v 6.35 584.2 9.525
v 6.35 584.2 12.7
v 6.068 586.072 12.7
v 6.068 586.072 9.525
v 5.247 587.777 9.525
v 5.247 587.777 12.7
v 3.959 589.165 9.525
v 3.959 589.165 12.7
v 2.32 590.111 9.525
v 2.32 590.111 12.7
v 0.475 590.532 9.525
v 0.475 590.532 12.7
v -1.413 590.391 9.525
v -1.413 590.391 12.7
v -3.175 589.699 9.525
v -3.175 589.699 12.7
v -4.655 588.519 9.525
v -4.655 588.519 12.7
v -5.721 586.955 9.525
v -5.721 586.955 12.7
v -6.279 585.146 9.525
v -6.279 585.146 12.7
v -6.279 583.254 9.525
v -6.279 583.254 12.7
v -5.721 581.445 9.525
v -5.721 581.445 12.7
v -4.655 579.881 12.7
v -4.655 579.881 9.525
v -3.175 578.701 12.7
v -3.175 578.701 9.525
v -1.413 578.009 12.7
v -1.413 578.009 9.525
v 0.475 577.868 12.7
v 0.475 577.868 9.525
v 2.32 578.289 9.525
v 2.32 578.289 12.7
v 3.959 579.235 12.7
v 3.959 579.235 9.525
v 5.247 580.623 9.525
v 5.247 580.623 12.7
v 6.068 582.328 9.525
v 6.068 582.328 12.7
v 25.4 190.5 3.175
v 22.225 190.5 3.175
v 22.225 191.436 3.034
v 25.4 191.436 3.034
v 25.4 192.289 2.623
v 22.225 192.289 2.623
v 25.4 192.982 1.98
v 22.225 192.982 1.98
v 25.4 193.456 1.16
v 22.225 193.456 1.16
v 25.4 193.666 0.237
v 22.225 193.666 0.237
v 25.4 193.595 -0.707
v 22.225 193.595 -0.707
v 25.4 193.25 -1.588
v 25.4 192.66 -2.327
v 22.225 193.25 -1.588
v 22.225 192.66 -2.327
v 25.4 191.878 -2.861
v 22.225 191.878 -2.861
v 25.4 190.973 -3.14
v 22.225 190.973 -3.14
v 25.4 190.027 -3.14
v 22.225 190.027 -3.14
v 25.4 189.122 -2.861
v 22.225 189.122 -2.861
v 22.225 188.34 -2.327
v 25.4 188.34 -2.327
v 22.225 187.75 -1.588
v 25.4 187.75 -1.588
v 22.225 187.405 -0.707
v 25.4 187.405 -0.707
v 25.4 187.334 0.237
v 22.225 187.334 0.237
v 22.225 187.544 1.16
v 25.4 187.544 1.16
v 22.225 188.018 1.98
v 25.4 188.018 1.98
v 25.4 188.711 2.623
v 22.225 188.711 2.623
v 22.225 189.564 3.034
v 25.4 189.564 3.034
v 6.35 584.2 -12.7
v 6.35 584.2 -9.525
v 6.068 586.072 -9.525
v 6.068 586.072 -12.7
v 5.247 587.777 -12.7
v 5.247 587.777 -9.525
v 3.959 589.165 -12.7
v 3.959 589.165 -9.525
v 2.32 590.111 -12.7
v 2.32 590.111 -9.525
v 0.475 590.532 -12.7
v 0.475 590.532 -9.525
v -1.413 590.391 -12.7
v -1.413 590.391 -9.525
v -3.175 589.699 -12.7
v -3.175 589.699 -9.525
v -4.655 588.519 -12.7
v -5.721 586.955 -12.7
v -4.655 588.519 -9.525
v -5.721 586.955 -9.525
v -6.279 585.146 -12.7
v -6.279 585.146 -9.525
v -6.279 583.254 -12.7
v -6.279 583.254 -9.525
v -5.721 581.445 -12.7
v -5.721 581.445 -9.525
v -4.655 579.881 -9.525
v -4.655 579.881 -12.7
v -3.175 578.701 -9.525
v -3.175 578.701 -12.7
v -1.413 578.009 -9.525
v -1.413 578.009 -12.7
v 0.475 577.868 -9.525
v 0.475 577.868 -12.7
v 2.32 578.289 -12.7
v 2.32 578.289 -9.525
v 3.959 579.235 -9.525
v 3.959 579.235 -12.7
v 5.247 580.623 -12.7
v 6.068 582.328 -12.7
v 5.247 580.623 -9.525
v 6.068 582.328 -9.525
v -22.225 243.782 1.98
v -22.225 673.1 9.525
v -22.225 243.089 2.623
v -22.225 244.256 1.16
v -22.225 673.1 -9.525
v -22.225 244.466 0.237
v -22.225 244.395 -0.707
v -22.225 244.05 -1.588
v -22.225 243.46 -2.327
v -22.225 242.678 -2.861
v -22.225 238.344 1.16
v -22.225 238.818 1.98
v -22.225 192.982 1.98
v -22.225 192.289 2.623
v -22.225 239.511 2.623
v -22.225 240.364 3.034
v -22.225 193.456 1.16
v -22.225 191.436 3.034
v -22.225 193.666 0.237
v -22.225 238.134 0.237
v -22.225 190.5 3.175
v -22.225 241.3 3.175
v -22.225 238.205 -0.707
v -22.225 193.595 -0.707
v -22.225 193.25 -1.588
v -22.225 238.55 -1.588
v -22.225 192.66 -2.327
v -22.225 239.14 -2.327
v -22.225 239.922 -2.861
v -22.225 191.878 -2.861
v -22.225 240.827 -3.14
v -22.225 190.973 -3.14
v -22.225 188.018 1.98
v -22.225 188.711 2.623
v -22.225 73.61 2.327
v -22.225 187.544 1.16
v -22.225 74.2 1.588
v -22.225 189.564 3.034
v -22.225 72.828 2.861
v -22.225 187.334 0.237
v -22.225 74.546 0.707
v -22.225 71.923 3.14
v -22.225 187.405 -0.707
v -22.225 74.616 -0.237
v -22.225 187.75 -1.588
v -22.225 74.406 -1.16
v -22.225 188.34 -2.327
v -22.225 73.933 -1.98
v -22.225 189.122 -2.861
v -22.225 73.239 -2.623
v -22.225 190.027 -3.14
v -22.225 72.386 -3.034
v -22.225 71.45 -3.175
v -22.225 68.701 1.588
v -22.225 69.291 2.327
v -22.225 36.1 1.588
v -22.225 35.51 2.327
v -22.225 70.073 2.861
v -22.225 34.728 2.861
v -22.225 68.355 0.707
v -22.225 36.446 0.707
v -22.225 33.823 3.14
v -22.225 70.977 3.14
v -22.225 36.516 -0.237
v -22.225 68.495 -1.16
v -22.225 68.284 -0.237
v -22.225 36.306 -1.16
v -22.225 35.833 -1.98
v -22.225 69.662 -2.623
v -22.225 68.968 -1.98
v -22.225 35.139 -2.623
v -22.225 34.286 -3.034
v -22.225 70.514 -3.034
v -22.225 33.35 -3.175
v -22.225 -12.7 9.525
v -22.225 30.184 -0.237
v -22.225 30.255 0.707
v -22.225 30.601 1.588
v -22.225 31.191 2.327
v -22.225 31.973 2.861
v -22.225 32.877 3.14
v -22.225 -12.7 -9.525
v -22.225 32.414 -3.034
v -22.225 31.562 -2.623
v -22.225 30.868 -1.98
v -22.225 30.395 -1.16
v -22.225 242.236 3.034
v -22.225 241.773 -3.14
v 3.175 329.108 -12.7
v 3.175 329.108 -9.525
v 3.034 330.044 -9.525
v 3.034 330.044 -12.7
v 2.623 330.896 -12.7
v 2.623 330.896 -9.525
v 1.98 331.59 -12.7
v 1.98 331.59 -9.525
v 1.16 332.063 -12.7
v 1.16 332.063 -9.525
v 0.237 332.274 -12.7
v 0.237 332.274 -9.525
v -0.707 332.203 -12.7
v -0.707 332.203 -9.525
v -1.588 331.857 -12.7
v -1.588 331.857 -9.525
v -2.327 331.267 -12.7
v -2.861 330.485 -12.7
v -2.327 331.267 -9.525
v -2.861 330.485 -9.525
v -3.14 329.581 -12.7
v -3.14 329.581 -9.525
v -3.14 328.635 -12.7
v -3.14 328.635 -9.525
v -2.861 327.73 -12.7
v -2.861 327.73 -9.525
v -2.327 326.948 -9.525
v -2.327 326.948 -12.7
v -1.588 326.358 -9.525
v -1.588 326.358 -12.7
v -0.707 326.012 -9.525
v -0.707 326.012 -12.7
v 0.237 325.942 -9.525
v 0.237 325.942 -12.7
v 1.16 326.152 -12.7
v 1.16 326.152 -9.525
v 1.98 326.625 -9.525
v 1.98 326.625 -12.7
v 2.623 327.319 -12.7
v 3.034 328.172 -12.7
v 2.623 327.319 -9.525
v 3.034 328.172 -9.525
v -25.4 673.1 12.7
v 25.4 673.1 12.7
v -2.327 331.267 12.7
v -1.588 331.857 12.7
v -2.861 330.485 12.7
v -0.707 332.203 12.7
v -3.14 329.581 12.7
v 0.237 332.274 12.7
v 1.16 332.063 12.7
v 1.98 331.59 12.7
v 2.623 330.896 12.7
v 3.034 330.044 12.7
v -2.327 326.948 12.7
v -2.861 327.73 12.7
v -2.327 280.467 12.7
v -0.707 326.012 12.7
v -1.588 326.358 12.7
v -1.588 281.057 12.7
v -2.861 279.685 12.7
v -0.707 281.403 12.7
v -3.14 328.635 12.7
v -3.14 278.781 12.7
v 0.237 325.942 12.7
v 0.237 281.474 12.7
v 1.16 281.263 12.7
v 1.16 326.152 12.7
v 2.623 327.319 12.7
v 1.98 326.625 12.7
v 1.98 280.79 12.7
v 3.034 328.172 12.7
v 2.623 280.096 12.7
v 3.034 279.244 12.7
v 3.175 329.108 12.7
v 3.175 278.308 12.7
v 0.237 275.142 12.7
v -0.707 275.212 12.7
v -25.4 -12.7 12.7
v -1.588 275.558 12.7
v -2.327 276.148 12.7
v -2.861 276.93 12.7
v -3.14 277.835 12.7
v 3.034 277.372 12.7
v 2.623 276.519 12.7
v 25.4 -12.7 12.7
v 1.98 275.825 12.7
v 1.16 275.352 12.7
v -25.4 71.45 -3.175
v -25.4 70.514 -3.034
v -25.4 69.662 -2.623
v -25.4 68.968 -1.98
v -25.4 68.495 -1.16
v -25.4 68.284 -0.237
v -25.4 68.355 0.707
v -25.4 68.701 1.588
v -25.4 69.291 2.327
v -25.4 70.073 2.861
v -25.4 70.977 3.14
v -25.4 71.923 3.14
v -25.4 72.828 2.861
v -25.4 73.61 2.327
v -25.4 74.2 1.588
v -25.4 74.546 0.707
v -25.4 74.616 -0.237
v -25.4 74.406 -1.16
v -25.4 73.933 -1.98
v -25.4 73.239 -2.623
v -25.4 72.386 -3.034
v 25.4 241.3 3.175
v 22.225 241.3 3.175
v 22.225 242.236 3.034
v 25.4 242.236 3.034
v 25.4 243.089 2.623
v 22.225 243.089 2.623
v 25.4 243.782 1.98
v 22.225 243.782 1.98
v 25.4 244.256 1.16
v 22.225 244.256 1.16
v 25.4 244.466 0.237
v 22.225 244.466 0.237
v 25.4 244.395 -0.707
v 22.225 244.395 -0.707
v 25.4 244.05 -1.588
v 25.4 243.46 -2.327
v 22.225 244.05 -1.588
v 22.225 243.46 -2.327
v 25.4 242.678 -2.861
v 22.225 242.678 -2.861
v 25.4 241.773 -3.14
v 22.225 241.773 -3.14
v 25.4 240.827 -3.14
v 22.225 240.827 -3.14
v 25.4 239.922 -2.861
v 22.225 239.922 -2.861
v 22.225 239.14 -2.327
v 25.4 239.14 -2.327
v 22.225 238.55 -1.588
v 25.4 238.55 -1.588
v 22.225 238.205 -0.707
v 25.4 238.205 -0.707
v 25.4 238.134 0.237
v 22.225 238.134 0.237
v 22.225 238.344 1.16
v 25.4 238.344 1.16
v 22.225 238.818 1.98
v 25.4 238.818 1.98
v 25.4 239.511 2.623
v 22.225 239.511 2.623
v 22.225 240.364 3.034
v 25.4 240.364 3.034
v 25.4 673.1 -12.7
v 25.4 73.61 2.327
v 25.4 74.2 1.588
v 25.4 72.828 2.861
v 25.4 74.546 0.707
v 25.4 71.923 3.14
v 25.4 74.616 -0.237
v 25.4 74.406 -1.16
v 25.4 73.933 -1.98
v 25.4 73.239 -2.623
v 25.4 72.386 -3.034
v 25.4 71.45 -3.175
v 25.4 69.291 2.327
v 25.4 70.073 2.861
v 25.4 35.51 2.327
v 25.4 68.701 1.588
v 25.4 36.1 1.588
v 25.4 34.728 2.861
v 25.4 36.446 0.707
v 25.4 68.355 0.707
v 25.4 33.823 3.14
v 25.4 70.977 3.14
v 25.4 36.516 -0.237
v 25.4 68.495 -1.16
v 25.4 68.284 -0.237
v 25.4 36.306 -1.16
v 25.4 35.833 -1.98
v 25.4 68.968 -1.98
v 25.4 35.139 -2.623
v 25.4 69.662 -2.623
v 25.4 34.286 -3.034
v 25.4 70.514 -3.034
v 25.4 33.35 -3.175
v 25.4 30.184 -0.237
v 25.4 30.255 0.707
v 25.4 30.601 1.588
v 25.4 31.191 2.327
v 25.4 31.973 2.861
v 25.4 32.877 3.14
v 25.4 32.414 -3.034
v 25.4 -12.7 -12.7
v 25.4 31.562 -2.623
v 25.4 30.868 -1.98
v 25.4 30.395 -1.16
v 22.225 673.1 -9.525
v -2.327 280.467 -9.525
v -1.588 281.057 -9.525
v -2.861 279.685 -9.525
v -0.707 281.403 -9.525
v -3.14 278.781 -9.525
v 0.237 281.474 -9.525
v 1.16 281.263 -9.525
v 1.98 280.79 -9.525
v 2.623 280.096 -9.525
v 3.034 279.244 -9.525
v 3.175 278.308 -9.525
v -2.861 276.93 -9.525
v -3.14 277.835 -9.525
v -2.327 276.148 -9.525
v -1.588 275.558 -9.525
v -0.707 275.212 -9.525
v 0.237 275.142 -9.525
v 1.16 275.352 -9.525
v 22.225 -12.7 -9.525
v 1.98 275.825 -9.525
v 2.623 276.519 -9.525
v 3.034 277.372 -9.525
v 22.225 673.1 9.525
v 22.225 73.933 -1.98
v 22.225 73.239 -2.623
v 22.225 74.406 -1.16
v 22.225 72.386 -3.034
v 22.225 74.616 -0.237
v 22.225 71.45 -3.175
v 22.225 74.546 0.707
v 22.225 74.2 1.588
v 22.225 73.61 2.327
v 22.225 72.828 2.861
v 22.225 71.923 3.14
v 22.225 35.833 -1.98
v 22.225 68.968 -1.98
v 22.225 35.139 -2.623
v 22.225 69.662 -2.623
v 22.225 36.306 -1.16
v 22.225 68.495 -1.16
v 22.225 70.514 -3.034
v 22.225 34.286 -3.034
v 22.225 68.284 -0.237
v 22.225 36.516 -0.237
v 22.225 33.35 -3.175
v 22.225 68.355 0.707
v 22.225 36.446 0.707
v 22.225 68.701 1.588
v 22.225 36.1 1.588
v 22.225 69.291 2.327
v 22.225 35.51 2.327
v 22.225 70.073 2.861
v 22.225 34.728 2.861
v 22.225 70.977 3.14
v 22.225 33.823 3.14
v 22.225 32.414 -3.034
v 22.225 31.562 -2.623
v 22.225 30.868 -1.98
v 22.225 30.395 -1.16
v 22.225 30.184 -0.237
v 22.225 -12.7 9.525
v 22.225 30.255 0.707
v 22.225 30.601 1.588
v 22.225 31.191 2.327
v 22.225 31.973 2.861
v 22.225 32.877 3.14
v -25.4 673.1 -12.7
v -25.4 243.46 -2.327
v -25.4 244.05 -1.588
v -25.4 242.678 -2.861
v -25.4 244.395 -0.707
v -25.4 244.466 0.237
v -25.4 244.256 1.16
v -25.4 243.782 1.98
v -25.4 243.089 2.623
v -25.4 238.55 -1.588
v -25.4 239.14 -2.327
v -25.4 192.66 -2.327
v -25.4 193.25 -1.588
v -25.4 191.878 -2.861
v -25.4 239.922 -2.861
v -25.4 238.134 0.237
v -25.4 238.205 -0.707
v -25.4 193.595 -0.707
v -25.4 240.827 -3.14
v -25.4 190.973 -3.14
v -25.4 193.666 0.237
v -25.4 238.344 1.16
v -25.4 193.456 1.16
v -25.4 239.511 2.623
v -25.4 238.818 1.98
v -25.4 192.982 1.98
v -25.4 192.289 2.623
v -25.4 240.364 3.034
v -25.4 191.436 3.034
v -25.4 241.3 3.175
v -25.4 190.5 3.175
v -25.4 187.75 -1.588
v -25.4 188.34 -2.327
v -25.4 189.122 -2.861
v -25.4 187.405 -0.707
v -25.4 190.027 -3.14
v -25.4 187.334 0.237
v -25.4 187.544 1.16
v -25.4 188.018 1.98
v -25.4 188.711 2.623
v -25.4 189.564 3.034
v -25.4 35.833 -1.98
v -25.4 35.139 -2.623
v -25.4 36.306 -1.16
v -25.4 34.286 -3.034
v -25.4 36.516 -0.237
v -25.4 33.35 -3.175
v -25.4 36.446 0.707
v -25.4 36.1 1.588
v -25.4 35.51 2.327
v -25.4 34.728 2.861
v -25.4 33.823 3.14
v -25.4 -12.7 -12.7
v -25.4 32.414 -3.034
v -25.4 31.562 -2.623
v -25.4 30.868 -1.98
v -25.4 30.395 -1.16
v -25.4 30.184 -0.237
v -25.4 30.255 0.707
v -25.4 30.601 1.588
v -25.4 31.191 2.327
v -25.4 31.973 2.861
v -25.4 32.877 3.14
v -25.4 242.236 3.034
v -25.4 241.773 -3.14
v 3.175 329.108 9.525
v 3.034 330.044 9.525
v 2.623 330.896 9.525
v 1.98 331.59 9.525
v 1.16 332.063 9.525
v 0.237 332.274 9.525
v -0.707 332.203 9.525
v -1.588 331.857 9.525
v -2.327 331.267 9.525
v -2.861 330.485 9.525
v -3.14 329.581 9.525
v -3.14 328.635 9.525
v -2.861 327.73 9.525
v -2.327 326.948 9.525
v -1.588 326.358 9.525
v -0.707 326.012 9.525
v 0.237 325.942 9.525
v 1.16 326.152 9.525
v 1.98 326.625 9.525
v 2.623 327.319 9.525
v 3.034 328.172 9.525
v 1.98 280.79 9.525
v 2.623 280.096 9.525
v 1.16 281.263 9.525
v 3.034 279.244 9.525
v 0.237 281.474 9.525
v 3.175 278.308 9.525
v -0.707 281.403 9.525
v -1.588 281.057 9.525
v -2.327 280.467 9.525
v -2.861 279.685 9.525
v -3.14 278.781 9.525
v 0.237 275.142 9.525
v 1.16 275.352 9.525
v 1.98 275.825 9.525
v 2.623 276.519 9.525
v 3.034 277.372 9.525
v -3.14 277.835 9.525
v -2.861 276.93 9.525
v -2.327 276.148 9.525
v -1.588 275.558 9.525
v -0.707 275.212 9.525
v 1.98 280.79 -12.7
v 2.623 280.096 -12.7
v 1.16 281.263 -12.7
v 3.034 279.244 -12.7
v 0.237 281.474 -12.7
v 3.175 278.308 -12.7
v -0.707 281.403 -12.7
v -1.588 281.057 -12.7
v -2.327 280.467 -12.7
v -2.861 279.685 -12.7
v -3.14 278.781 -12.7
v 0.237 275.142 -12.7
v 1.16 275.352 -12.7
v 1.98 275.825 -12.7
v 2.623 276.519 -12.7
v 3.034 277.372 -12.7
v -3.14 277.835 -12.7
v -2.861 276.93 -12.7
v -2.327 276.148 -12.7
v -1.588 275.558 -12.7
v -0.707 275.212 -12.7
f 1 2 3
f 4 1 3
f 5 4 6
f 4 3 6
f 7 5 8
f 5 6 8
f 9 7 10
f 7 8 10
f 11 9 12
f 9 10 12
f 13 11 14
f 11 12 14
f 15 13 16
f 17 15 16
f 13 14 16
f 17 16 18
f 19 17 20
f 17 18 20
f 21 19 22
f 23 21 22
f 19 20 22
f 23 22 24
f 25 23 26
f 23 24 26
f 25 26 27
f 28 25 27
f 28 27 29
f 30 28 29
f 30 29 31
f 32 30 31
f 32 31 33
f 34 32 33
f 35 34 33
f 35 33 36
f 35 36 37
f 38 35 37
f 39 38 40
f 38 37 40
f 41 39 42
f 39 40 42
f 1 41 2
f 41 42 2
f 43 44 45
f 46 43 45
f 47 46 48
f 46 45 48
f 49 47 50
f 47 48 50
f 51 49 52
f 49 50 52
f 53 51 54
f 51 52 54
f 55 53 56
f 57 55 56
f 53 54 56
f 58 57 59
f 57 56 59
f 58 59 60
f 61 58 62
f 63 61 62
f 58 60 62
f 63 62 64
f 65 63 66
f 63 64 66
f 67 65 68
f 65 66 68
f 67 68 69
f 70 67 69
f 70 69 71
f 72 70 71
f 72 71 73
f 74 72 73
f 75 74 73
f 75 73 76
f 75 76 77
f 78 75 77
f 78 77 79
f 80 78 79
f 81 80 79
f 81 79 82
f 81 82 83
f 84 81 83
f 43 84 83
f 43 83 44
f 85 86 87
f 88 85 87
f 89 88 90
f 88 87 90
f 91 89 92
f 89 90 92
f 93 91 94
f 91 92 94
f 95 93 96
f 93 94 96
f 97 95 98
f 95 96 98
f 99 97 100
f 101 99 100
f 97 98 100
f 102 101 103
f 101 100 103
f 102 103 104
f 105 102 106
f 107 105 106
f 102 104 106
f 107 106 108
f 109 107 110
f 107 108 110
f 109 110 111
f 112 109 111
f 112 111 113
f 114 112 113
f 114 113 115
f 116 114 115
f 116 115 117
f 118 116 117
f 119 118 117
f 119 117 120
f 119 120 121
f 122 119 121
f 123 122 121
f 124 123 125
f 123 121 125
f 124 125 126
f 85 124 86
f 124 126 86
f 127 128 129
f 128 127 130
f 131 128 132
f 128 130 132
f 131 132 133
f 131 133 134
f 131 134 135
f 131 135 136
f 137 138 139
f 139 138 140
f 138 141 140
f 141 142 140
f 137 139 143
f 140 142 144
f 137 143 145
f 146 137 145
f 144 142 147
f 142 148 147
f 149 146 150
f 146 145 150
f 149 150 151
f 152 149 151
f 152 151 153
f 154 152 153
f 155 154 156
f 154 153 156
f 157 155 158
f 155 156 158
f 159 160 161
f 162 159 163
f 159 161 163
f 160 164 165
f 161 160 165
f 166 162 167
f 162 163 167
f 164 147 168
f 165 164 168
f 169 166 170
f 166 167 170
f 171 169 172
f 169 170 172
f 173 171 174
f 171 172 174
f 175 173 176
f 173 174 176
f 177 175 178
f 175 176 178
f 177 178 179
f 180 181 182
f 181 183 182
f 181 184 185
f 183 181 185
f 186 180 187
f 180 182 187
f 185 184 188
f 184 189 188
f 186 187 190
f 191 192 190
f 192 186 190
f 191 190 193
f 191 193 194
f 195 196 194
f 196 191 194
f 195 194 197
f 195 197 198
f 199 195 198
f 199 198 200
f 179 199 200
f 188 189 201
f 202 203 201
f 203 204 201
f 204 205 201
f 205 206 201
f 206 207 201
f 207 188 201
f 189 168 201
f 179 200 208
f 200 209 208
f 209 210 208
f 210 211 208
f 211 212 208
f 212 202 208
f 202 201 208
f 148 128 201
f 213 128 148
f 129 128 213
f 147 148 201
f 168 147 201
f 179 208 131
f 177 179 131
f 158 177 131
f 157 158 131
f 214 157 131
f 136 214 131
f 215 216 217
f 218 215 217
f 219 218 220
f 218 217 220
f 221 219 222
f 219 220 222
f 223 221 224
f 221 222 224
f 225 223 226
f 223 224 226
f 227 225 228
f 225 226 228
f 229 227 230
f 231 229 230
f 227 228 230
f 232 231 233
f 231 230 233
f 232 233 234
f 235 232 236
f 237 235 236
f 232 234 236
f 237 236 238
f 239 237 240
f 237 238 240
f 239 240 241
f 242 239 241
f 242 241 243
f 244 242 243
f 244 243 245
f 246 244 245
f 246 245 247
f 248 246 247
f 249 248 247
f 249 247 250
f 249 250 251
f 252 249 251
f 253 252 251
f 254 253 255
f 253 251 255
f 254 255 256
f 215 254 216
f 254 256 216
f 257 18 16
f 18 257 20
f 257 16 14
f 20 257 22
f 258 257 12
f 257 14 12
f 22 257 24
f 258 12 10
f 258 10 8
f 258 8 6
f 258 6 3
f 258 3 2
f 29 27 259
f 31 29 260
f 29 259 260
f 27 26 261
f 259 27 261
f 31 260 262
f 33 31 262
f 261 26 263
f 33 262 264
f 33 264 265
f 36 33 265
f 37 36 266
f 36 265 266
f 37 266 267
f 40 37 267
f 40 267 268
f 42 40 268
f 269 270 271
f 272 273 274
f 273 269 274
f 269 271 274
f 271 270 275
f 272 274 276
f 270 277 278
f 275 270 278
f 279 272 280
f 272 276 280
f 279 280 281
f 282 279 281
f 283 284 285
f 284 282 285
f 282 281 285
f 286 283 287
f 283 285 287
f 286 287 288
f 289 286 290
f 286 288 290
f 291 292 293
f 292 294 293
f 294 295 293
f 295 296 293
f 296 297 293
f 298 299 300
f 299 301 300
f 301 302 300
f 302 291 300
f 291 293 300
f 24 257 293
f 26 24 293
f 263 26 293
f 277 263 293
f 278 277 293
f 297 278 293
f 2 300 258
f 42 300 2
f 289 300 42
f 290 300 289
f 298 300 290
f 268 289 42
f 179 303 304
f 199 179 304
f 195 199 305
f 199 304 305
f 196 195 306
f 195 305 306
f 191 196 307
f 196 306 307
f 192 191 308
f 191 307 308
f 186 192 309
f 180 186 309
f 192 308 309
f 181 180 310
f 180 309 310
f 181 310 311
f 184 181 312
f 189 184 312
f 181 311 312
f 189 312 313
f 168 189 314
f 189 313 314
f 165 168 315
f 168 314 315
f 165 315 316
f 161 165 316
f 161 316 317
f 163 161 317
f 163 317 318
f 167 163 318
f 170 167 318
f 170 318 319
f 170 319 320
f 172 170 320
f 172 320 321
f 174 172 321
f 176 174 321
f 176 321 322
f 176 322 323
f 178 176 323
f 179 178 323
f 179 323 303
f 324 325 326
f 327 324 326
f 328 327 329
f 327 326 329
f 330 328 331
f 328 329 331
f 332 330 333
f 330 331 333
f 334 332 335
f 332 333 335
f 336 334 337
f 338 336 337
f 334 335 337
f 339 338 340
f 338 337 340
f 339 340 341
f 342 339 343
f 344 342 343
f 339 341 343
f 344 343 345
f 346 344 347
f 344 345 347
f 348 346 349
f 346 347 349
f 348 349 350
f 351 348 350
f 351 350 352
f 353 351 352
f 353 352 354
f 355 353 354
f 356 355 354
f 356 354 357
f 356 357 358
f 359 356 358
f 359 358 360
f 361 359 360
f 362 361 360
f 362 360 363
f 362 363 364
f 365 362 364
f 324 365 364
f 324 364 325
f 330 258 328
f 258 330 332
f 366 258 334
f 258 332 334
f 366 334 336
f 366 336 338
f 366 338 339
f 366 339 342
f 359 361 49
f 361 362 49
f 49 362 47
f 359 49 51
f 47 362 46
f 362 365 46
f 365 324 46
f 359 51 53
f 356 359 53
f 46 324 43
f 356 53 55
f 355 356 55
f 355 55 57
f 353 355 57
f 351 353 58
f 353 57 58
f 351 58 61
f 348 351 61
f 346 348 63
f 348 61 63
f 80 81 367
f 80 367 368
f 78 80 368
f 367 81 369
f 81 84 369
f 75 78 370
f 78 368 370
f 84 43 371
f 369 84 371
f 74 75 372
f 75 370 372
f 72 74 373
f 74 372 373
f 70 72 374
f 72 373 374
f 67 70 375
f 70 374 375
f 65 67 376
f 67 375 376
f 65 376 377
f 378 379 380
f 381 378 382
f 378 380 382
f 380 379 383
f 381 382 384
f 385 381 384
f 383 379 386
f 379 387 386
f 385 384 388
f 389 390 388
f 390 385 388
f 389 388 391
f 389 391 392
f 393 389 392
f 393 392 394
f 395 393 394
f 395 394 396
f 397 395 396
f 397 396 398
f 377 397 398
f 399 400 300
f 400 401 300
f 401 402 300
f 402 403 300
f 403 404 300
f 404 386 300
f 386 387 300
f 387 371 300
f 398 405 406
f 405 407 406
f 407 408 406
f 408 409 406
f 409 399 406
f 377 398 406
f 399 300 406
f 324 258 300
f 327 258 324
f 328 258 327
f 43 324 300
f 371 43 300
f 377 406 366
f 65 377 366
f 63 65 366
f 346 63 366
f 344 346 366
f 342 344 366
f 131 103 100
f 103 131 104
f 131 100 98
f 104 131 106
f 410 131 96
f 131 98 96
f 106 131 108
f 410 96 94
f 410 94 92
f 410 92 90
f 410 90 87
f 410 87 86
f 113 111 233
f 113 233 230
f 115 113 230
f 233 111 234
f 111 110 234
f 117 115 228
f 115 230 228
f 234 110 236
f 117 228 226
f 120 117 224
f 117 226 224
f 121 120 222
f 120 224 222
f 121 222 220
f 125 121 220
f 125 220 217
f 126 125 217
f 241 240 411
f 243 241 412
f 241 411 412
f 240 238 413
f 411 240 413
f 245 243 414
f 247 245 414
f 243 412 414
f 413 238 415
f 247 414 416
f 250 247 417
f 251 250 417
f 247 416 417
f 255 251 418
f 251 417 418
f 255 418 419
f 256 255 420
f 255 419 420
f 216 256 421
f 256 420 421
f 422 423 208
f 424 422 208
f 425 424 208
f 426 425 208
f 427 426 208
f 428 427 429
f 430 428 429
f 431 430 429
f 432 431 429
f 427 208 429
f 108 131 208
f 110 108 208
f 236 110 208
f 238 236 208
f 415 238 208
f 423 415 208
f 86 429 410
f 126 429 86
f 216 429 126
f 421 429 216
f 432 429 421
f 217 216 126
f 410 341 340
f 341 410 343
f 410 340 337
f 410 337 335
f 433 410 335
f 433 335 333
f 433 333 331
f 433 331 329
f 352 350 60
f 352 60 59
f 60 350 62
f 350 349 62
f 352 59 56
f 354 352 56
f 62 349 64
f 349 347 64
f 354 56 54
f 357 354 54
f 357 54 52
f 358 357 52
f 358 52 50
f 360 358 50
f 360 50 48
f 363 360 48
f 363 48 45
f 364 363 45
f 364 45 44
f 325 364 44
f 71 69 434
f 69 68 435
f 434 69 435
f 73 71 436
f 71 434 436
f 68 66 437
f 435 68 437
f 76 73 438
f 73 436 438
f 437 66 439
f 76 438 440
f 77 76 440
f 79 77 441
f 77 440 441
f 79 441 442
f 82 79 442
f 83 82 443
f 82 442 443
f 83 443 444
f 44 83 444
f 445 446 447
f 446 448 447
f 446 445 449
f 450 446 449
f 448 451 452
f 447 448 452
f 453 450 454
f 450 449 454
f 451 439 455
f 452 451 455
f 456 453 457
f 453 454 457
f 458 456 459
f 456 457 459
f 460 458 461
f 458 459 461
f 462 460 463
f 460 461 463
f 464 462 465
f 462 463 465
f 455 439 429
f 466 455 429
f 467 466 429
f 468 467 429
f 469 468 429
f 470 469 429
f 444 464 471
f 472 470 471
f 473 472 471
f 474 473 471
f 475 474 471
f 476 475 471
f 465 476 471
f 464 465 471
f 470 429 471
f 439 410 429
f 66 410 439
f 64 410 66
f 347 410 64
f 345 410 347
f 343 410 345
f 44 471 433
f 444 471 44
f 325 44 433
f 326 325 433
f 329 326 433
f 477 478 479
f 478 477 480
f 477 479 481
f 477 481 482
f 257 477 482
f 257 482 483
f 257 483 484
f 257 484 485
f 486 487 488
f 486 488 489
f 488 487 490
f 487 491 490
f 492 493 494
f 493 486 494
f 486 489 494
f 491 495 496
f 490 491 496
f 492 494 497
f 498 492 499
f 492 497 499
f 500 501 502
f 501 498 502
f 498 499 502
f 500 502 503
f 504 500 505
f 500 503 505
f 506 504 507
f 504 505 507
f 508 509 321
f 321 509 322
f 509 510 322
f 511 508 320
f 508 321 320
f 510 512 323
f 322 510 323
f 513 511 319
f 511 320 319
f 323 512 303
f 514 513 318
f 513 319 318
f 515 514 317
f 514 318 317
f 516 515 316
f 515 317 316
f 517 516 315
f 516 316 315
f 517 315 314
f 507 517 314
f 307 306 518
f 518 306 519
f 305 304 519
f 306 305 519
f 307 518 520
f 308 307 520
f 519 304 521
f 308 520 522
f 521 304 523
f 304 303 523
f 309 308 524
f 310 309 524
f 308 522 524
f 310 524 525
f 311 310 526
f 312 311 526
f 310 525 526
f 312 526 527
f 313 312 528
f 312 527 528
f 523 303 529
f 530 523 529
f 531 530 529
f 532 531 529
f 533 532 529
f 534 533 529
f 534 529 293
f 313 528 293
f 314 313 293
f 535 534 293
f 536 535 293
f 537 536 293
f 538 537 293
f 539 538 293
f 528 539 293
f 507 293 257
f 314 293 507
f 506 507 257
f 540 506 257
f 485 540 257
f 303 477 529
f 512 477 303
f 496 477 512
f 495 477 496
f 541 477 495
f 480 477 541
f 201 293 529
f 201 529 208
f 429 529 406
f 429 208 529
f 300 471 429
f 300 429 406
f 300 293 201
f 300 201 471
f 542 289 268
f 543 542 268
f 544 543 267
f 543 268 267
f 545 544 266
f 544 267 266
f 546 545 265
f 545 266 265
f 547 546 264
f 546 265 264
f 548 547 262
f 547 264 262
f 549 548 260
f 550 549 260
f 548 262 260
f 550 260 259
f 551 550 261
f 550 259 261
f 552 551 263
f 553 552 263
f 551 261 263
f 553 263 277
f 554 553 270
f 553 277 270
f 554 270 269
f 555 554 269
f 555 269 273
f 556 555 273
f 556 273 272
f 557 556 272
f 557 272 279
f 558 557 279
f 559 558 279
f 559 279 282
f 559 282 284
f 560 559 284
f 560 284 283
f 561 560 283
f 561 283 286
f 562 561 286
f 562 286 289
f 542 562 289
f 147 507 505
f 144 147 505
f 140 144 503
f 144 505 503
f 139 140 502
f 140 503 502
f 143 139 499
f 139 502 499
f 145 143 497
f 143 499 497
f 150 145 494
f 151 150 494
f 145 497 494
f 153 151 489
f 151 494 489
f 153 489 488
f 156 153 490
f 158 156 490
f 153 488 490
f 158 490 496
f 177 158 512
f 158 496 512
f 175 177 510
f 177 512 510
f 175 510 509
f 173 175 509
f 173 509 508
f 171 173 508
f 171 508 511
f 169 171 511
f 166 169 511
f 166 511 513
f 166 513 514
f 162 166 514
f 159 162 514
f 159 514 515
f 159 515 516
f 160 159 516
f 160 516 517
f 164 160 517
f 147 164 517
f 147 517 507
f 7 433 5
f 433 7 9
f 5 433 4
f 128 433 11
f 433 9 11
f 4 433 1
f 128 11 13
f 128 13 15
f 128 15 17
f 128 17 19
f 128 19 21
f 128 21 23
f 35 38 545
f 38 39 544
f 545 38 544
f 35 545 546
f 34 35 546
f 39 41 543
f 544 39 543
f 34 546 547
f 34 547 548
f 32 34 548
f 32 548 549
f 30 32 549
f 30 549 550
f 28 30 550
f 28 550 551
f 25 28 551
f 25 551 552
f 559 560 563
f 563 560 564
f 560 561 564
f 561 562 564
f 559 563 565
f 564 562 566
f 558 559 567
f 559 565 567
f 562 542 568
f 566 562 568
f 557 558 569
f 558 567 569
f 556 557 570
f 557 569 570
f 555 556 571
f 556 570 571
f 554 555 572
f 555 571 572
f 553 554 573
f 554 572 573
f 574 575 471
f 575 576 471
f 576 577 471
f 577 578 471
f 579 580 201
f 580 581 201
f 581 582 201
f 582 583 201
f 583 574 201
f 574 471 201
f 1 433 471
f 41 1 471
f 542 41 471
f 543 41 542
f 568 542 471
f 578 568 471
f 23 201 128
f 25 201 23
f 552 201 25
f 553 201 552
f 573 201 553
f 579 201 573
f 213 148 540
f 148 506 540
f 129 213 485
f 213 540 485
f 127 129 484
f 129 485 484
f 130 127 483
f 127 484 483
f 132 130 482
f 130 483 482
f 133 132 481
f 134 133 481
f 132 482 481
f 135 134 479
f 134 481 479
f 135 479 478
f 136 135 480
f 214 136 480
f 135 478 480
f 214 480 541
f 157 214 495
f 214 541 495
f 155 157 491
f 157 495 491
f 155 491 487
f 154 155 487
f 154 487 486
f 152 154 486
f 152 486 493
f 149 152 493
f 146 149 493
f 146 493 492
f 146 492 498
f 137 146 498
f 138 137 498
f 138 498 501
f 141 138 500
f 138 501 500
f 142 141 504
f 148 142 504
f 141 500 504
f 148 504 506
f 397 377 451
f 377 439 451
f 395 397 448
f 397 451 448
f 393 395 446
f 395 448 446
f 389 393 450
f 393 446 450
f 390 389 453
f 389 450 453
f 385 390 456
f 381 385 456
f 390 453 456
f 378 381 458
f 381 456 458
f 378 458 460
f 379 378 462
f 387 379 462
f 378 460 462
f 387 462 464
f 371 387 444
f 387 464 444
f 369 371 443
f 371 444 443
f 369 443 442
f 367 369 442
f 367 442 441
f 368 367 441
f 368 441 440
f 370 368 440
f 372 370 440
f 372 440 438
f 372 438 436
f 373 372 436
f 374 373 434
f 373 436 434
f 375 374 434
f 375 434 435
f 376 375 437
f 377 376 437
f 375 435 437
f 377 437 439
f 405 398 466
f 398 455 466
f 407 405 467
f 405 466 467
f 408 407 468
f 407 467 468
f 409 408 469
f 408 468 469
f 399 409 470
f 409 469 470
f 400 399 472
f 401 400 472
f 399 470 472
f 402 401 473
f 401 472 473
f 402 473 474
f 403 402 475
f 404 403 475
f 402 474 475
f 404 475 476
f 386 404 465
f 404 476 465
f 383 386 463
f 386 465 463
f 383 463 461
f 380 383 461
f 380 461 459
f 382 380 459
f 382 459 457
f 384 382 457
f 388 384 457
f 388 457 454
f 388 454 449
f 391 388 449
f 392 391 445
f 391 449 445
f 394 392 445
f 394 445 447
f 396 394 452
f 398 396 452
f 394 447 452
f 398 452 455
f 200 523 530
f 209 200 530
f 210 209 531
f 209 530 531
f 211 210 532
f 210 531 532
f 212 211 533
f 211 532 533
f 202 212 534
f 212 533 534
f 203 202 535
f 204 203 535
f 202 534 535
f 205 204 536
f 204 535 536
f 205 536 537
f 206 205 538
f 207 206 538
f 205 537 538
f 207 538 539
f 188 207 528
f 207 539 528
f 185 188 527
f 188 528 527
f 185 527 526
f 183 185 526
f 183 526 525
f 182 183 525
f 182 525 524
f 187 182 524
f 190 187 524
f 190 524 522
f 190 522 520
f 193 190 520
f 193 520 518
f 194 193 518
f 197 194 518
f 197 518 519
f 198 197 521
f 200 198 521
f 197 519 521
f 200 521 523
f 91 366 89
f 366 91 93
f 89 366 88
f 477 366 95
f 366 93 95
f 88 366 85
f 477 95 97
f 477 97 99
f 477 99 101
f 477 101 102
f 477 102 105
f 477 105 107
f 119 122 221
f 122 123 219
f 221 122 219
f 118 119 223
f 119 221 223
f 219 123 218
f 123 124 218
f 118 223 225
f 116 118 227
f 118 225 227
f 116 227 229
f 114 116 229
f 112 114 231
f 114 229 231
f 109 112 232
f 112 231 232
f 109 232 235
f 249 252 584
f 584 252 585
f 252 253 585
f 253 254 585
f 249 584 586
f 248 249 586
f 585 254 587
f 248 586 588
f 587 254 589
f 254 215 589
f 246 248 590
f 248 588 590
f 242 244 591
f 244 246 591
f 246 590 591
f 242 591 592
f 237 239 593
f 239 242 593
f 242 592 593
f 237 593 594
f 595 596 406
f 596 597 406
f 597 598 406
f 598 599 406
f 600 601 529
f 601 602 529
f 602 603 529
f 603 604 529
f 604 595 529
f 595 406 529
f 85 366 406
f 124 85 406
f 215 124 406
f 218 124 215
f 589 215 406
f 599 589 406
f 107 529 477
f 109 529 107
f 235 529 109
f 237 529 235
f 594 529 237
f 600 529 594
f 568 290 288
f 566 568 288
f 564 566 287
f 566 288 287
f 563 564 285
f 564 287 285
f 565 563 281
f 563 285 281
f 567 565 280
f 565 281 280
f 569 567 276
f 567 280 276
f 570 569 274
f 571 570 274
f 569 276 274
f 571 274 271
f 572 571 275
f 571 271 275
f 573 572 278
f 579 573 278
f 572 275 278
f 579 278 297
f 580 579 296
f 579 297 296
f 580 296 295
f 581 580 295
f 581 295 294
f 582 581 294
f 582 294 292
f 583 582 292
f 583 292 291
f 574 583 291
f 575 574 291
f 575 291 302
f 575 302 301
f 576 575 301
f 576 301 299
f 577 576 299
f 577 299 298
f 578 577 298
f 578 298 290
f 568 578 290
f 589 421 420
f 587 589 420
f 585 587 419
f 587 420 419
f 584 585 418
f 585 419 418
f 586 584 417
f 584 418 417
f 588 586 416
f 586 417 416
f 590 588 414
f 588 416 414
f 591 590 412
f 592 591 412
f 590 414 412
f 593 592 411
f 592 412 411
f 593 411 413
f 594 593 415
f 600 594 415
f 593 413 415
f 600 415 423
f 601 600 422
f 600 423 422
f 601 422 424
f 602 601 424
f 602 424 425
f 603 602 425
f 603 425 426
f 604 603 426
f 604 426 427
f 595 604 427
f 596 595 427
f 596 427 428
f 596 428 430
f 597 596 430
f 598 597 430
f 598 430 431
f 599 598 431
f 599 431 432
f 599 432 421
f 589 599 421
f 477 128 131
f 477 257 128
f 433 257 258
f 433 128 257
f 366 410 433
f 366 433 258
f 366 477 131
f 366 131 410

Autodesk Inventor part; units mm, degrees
ref_plane "YZ Plane" through (0, 0, 0) normal (1, 0, 0) x (0, 1, 0)
ref_plane "XZ Plane" through (0, 0, 0) normal (0, 1, 0) x (-1, 0, 0)
ref_plane "XY Plane" through (0, 0, 0) normal (0, 0, 1) x (1, 0, 0)
sketch "Sketch1" plane through (0, 0, 0) normal (0, 1, 0) x (-1, 0, 0)
  line L0 (-25.4, -12.7) -> (25.4, -12.7)
  line L1 (25.4, -12.7) -> (25.4, 12.7)
  line L2 (25.4, 12.7) -> (-25.4, 12.7)
  line L3 (-25.4, 12.7) -> (-25.4, -12.7)
  line L4 (-25.4, -12.7) -> (25.4, 12.7) construction
  line L5 (25.4, -12.7) -> (-25.4, 12.7) construction
  line L6 (22.225, -9.525) -> (-22.225, -9.525)
  line L7 (-22.225, -9.525) -> (-22.225, 9.525)
  line L8 (-22.225, 9.525) -> (22.225, 9.525)
  line L9 (22.225, 9.525) -> (22.225, -9.525)
  line L10 (22.225, -9.525) -> (-22.225, 9.525) construction
  line L11 (-22.225, -9.525) -> (22.225, 9.525) construction
  point P0 (0, 0)
  dimension "d0" = 50.8
  dimension "d1" = 25.4
  dimension "d2" = 44.45
  dimension "d3" = 19.05
extrude "Extrusion1" add sketch "Sketch1" along normal blind 609.6
sketch "Sketch2" plane through (-25.4, 0, 12.7) normal (0, 0, 1) x (1, 0, 0)
  line L0 (0, 609.6) -> (25.4, 609.6)
  line L1 (25.4, 609.6) -> (25.4, 584.2)
  line L2 (25.4, 584.2) -> (0, 584.2)
  line L3 (0, 584.2) -> (0, 609.6)
  circle A0 centre (25.4, 584.2) radius 6.35
  point P0 (25.4, 0)
  dimension "d6" = 25.4
  dimension "d7" = 25.4
  dimension "d8" = 12.7
extrude "Extrusion2" cut sketch "Sketch2" against normal blind 609.6 contours A0 L2 L1 | L1 L2 A0
sketch "Sketch4" plane through (0, 0, 0) normal (0, -1, 0) x (1, 0, 0)
  line L0 (22.225, 9.525) -> (22.225, -9.525) projected
  line L1 (22.225, -9.525) -> (-22.225, -9.525) projected
  line L2 (-22.225, -9.525) -> (-22.225, 9.525) projected
  line L3 (-22.225, 9.525) -> (22.225, 9.525) projected
  line L4 (25.4, -12.7) -> (-25.4, -12.7) projected
  line L5 (25.4, 12.7) -> (25.4, -12.7) projected
  line L6 (-25.4, 12.7) -> (25.4, 12.7) projected
  line L7 (-25.4, -12.7) -> (-25.4, 12.7) projected
  point P0 (0, 0)
extrude "Extrusion4" add sketch "Sketch4" along normal blind 12.7
sketch "Sketch6" plane through (0, 609.6, 0) normal (0, 1, 0) x (1, 0, 0)
  line L0 (22.225, 9.525) -> (22.225, -9.525) projected
  line L1 (22.225, -9.525) -> (-22.225, -9.525) projected
  line L2 (-22.225, -9.525) -> (-22.225, 9.525) projected
  line L3 (-22.225, 9.525) -> (22.225, 9.525) projected
  line L4 (25.4, 12.7) -> (-25.4, 12.7) projected
  line L5 (-25.4, 12.7) -> (-25.4, -12.7) projected
  line L6 (-25.4, -12.7) -> (25.4, -12.7) projected
  line L7 (25.4, -12.7) -> (25.4, 12.7) projected
  point P0 (0, 0)
extrude "Extrusion6" add sketch "Sketch6" along normal blind 63.5
sketch "Sketch8" plane through (-25.4, -12.7, 12.7) normal (0, 0, 1) x (1, 0, 0)
  line L0 (50.8, 0) -> (50.8, 685.8) projected
  line L1 (0, 685.8) -> (50.8, 685.8) projected
  line L2 (25.4, 685.8) -> (25.4, 341.8078)
  line L3 (25.4, 685.8) -> (369.3922, 685.8) construction
  line L4 (25.4, 341.8078) -> (25.4, 291.0078)
  circle A0 centre (25.4, 291.0078) radius 3.175
  circle A1 centre (25.4, 341.8078) radius 3.175
  point P0 (25.4, 12.7)
  dimension "d49" = 343.9922
  dimension "d50" = 90
  dimension "d51" = 50.8
  dimension "d52" = 180
  dimension "d53" = 6.35
  dimension "d54" = 6.35
extrude "Extrusion9" cut sketch "Sketch8" against normal blind 50.8
sketch "Sketch9" plane through (25.4, -12.7, 12.7) normal (1, 0, 0) x (0, 0, -1)
  line L0 (25.4, 0) -> (0, 0) projected
  line L1 (12.7, 0) -> (12.7, 84.1502)
  line L2 (12.7, 84.1502) -> (12.7, 46.0502)
  line L3 (12.7, 84.1502) -> (50.8, 84.1502) construction
  point P0 (12.7, 12.7)
  dimension "d57" = 84.1502
  dimension "d58" = 38.1
  dimension "d59" = 90
hole "Hole1" at (25.4, 71.4502, 0) at (25.4, 33.3502, 0) direction (-1, 0, 0) diameter 6.35 end through all
sketch "Sketch10" plane through (-25.4, -12.7, -12.7) normal (-1, 0, 0) x (0, 0, 1)
  line L0 (25.4, 0) -> (25.4, 685.8) projected
  line L1 (0, 685.8) -> (25.4, 685.8) projected
  line L2 (12.7, 685.8) -> (12.7, 254)
  line L3 (12.7, 254) -> (12.7, 203.2)
  circle A0 centre (12.7, 254) radius 3.175
  circle A1 centre (12.7, 203.2) radius 3.175
  point P0 (12.7, 12.7)
  dimension "d67" = 431.8
  dimension "d68" = 50.8
  dimension "d69" = 180
  dimension "d70" = 6.35
  dimension "d71" = 6.35
extrude "Extrusion10" cut sketch "Sketch10" against normal blind 50.8
properties part number "SuperSuperStructure"
